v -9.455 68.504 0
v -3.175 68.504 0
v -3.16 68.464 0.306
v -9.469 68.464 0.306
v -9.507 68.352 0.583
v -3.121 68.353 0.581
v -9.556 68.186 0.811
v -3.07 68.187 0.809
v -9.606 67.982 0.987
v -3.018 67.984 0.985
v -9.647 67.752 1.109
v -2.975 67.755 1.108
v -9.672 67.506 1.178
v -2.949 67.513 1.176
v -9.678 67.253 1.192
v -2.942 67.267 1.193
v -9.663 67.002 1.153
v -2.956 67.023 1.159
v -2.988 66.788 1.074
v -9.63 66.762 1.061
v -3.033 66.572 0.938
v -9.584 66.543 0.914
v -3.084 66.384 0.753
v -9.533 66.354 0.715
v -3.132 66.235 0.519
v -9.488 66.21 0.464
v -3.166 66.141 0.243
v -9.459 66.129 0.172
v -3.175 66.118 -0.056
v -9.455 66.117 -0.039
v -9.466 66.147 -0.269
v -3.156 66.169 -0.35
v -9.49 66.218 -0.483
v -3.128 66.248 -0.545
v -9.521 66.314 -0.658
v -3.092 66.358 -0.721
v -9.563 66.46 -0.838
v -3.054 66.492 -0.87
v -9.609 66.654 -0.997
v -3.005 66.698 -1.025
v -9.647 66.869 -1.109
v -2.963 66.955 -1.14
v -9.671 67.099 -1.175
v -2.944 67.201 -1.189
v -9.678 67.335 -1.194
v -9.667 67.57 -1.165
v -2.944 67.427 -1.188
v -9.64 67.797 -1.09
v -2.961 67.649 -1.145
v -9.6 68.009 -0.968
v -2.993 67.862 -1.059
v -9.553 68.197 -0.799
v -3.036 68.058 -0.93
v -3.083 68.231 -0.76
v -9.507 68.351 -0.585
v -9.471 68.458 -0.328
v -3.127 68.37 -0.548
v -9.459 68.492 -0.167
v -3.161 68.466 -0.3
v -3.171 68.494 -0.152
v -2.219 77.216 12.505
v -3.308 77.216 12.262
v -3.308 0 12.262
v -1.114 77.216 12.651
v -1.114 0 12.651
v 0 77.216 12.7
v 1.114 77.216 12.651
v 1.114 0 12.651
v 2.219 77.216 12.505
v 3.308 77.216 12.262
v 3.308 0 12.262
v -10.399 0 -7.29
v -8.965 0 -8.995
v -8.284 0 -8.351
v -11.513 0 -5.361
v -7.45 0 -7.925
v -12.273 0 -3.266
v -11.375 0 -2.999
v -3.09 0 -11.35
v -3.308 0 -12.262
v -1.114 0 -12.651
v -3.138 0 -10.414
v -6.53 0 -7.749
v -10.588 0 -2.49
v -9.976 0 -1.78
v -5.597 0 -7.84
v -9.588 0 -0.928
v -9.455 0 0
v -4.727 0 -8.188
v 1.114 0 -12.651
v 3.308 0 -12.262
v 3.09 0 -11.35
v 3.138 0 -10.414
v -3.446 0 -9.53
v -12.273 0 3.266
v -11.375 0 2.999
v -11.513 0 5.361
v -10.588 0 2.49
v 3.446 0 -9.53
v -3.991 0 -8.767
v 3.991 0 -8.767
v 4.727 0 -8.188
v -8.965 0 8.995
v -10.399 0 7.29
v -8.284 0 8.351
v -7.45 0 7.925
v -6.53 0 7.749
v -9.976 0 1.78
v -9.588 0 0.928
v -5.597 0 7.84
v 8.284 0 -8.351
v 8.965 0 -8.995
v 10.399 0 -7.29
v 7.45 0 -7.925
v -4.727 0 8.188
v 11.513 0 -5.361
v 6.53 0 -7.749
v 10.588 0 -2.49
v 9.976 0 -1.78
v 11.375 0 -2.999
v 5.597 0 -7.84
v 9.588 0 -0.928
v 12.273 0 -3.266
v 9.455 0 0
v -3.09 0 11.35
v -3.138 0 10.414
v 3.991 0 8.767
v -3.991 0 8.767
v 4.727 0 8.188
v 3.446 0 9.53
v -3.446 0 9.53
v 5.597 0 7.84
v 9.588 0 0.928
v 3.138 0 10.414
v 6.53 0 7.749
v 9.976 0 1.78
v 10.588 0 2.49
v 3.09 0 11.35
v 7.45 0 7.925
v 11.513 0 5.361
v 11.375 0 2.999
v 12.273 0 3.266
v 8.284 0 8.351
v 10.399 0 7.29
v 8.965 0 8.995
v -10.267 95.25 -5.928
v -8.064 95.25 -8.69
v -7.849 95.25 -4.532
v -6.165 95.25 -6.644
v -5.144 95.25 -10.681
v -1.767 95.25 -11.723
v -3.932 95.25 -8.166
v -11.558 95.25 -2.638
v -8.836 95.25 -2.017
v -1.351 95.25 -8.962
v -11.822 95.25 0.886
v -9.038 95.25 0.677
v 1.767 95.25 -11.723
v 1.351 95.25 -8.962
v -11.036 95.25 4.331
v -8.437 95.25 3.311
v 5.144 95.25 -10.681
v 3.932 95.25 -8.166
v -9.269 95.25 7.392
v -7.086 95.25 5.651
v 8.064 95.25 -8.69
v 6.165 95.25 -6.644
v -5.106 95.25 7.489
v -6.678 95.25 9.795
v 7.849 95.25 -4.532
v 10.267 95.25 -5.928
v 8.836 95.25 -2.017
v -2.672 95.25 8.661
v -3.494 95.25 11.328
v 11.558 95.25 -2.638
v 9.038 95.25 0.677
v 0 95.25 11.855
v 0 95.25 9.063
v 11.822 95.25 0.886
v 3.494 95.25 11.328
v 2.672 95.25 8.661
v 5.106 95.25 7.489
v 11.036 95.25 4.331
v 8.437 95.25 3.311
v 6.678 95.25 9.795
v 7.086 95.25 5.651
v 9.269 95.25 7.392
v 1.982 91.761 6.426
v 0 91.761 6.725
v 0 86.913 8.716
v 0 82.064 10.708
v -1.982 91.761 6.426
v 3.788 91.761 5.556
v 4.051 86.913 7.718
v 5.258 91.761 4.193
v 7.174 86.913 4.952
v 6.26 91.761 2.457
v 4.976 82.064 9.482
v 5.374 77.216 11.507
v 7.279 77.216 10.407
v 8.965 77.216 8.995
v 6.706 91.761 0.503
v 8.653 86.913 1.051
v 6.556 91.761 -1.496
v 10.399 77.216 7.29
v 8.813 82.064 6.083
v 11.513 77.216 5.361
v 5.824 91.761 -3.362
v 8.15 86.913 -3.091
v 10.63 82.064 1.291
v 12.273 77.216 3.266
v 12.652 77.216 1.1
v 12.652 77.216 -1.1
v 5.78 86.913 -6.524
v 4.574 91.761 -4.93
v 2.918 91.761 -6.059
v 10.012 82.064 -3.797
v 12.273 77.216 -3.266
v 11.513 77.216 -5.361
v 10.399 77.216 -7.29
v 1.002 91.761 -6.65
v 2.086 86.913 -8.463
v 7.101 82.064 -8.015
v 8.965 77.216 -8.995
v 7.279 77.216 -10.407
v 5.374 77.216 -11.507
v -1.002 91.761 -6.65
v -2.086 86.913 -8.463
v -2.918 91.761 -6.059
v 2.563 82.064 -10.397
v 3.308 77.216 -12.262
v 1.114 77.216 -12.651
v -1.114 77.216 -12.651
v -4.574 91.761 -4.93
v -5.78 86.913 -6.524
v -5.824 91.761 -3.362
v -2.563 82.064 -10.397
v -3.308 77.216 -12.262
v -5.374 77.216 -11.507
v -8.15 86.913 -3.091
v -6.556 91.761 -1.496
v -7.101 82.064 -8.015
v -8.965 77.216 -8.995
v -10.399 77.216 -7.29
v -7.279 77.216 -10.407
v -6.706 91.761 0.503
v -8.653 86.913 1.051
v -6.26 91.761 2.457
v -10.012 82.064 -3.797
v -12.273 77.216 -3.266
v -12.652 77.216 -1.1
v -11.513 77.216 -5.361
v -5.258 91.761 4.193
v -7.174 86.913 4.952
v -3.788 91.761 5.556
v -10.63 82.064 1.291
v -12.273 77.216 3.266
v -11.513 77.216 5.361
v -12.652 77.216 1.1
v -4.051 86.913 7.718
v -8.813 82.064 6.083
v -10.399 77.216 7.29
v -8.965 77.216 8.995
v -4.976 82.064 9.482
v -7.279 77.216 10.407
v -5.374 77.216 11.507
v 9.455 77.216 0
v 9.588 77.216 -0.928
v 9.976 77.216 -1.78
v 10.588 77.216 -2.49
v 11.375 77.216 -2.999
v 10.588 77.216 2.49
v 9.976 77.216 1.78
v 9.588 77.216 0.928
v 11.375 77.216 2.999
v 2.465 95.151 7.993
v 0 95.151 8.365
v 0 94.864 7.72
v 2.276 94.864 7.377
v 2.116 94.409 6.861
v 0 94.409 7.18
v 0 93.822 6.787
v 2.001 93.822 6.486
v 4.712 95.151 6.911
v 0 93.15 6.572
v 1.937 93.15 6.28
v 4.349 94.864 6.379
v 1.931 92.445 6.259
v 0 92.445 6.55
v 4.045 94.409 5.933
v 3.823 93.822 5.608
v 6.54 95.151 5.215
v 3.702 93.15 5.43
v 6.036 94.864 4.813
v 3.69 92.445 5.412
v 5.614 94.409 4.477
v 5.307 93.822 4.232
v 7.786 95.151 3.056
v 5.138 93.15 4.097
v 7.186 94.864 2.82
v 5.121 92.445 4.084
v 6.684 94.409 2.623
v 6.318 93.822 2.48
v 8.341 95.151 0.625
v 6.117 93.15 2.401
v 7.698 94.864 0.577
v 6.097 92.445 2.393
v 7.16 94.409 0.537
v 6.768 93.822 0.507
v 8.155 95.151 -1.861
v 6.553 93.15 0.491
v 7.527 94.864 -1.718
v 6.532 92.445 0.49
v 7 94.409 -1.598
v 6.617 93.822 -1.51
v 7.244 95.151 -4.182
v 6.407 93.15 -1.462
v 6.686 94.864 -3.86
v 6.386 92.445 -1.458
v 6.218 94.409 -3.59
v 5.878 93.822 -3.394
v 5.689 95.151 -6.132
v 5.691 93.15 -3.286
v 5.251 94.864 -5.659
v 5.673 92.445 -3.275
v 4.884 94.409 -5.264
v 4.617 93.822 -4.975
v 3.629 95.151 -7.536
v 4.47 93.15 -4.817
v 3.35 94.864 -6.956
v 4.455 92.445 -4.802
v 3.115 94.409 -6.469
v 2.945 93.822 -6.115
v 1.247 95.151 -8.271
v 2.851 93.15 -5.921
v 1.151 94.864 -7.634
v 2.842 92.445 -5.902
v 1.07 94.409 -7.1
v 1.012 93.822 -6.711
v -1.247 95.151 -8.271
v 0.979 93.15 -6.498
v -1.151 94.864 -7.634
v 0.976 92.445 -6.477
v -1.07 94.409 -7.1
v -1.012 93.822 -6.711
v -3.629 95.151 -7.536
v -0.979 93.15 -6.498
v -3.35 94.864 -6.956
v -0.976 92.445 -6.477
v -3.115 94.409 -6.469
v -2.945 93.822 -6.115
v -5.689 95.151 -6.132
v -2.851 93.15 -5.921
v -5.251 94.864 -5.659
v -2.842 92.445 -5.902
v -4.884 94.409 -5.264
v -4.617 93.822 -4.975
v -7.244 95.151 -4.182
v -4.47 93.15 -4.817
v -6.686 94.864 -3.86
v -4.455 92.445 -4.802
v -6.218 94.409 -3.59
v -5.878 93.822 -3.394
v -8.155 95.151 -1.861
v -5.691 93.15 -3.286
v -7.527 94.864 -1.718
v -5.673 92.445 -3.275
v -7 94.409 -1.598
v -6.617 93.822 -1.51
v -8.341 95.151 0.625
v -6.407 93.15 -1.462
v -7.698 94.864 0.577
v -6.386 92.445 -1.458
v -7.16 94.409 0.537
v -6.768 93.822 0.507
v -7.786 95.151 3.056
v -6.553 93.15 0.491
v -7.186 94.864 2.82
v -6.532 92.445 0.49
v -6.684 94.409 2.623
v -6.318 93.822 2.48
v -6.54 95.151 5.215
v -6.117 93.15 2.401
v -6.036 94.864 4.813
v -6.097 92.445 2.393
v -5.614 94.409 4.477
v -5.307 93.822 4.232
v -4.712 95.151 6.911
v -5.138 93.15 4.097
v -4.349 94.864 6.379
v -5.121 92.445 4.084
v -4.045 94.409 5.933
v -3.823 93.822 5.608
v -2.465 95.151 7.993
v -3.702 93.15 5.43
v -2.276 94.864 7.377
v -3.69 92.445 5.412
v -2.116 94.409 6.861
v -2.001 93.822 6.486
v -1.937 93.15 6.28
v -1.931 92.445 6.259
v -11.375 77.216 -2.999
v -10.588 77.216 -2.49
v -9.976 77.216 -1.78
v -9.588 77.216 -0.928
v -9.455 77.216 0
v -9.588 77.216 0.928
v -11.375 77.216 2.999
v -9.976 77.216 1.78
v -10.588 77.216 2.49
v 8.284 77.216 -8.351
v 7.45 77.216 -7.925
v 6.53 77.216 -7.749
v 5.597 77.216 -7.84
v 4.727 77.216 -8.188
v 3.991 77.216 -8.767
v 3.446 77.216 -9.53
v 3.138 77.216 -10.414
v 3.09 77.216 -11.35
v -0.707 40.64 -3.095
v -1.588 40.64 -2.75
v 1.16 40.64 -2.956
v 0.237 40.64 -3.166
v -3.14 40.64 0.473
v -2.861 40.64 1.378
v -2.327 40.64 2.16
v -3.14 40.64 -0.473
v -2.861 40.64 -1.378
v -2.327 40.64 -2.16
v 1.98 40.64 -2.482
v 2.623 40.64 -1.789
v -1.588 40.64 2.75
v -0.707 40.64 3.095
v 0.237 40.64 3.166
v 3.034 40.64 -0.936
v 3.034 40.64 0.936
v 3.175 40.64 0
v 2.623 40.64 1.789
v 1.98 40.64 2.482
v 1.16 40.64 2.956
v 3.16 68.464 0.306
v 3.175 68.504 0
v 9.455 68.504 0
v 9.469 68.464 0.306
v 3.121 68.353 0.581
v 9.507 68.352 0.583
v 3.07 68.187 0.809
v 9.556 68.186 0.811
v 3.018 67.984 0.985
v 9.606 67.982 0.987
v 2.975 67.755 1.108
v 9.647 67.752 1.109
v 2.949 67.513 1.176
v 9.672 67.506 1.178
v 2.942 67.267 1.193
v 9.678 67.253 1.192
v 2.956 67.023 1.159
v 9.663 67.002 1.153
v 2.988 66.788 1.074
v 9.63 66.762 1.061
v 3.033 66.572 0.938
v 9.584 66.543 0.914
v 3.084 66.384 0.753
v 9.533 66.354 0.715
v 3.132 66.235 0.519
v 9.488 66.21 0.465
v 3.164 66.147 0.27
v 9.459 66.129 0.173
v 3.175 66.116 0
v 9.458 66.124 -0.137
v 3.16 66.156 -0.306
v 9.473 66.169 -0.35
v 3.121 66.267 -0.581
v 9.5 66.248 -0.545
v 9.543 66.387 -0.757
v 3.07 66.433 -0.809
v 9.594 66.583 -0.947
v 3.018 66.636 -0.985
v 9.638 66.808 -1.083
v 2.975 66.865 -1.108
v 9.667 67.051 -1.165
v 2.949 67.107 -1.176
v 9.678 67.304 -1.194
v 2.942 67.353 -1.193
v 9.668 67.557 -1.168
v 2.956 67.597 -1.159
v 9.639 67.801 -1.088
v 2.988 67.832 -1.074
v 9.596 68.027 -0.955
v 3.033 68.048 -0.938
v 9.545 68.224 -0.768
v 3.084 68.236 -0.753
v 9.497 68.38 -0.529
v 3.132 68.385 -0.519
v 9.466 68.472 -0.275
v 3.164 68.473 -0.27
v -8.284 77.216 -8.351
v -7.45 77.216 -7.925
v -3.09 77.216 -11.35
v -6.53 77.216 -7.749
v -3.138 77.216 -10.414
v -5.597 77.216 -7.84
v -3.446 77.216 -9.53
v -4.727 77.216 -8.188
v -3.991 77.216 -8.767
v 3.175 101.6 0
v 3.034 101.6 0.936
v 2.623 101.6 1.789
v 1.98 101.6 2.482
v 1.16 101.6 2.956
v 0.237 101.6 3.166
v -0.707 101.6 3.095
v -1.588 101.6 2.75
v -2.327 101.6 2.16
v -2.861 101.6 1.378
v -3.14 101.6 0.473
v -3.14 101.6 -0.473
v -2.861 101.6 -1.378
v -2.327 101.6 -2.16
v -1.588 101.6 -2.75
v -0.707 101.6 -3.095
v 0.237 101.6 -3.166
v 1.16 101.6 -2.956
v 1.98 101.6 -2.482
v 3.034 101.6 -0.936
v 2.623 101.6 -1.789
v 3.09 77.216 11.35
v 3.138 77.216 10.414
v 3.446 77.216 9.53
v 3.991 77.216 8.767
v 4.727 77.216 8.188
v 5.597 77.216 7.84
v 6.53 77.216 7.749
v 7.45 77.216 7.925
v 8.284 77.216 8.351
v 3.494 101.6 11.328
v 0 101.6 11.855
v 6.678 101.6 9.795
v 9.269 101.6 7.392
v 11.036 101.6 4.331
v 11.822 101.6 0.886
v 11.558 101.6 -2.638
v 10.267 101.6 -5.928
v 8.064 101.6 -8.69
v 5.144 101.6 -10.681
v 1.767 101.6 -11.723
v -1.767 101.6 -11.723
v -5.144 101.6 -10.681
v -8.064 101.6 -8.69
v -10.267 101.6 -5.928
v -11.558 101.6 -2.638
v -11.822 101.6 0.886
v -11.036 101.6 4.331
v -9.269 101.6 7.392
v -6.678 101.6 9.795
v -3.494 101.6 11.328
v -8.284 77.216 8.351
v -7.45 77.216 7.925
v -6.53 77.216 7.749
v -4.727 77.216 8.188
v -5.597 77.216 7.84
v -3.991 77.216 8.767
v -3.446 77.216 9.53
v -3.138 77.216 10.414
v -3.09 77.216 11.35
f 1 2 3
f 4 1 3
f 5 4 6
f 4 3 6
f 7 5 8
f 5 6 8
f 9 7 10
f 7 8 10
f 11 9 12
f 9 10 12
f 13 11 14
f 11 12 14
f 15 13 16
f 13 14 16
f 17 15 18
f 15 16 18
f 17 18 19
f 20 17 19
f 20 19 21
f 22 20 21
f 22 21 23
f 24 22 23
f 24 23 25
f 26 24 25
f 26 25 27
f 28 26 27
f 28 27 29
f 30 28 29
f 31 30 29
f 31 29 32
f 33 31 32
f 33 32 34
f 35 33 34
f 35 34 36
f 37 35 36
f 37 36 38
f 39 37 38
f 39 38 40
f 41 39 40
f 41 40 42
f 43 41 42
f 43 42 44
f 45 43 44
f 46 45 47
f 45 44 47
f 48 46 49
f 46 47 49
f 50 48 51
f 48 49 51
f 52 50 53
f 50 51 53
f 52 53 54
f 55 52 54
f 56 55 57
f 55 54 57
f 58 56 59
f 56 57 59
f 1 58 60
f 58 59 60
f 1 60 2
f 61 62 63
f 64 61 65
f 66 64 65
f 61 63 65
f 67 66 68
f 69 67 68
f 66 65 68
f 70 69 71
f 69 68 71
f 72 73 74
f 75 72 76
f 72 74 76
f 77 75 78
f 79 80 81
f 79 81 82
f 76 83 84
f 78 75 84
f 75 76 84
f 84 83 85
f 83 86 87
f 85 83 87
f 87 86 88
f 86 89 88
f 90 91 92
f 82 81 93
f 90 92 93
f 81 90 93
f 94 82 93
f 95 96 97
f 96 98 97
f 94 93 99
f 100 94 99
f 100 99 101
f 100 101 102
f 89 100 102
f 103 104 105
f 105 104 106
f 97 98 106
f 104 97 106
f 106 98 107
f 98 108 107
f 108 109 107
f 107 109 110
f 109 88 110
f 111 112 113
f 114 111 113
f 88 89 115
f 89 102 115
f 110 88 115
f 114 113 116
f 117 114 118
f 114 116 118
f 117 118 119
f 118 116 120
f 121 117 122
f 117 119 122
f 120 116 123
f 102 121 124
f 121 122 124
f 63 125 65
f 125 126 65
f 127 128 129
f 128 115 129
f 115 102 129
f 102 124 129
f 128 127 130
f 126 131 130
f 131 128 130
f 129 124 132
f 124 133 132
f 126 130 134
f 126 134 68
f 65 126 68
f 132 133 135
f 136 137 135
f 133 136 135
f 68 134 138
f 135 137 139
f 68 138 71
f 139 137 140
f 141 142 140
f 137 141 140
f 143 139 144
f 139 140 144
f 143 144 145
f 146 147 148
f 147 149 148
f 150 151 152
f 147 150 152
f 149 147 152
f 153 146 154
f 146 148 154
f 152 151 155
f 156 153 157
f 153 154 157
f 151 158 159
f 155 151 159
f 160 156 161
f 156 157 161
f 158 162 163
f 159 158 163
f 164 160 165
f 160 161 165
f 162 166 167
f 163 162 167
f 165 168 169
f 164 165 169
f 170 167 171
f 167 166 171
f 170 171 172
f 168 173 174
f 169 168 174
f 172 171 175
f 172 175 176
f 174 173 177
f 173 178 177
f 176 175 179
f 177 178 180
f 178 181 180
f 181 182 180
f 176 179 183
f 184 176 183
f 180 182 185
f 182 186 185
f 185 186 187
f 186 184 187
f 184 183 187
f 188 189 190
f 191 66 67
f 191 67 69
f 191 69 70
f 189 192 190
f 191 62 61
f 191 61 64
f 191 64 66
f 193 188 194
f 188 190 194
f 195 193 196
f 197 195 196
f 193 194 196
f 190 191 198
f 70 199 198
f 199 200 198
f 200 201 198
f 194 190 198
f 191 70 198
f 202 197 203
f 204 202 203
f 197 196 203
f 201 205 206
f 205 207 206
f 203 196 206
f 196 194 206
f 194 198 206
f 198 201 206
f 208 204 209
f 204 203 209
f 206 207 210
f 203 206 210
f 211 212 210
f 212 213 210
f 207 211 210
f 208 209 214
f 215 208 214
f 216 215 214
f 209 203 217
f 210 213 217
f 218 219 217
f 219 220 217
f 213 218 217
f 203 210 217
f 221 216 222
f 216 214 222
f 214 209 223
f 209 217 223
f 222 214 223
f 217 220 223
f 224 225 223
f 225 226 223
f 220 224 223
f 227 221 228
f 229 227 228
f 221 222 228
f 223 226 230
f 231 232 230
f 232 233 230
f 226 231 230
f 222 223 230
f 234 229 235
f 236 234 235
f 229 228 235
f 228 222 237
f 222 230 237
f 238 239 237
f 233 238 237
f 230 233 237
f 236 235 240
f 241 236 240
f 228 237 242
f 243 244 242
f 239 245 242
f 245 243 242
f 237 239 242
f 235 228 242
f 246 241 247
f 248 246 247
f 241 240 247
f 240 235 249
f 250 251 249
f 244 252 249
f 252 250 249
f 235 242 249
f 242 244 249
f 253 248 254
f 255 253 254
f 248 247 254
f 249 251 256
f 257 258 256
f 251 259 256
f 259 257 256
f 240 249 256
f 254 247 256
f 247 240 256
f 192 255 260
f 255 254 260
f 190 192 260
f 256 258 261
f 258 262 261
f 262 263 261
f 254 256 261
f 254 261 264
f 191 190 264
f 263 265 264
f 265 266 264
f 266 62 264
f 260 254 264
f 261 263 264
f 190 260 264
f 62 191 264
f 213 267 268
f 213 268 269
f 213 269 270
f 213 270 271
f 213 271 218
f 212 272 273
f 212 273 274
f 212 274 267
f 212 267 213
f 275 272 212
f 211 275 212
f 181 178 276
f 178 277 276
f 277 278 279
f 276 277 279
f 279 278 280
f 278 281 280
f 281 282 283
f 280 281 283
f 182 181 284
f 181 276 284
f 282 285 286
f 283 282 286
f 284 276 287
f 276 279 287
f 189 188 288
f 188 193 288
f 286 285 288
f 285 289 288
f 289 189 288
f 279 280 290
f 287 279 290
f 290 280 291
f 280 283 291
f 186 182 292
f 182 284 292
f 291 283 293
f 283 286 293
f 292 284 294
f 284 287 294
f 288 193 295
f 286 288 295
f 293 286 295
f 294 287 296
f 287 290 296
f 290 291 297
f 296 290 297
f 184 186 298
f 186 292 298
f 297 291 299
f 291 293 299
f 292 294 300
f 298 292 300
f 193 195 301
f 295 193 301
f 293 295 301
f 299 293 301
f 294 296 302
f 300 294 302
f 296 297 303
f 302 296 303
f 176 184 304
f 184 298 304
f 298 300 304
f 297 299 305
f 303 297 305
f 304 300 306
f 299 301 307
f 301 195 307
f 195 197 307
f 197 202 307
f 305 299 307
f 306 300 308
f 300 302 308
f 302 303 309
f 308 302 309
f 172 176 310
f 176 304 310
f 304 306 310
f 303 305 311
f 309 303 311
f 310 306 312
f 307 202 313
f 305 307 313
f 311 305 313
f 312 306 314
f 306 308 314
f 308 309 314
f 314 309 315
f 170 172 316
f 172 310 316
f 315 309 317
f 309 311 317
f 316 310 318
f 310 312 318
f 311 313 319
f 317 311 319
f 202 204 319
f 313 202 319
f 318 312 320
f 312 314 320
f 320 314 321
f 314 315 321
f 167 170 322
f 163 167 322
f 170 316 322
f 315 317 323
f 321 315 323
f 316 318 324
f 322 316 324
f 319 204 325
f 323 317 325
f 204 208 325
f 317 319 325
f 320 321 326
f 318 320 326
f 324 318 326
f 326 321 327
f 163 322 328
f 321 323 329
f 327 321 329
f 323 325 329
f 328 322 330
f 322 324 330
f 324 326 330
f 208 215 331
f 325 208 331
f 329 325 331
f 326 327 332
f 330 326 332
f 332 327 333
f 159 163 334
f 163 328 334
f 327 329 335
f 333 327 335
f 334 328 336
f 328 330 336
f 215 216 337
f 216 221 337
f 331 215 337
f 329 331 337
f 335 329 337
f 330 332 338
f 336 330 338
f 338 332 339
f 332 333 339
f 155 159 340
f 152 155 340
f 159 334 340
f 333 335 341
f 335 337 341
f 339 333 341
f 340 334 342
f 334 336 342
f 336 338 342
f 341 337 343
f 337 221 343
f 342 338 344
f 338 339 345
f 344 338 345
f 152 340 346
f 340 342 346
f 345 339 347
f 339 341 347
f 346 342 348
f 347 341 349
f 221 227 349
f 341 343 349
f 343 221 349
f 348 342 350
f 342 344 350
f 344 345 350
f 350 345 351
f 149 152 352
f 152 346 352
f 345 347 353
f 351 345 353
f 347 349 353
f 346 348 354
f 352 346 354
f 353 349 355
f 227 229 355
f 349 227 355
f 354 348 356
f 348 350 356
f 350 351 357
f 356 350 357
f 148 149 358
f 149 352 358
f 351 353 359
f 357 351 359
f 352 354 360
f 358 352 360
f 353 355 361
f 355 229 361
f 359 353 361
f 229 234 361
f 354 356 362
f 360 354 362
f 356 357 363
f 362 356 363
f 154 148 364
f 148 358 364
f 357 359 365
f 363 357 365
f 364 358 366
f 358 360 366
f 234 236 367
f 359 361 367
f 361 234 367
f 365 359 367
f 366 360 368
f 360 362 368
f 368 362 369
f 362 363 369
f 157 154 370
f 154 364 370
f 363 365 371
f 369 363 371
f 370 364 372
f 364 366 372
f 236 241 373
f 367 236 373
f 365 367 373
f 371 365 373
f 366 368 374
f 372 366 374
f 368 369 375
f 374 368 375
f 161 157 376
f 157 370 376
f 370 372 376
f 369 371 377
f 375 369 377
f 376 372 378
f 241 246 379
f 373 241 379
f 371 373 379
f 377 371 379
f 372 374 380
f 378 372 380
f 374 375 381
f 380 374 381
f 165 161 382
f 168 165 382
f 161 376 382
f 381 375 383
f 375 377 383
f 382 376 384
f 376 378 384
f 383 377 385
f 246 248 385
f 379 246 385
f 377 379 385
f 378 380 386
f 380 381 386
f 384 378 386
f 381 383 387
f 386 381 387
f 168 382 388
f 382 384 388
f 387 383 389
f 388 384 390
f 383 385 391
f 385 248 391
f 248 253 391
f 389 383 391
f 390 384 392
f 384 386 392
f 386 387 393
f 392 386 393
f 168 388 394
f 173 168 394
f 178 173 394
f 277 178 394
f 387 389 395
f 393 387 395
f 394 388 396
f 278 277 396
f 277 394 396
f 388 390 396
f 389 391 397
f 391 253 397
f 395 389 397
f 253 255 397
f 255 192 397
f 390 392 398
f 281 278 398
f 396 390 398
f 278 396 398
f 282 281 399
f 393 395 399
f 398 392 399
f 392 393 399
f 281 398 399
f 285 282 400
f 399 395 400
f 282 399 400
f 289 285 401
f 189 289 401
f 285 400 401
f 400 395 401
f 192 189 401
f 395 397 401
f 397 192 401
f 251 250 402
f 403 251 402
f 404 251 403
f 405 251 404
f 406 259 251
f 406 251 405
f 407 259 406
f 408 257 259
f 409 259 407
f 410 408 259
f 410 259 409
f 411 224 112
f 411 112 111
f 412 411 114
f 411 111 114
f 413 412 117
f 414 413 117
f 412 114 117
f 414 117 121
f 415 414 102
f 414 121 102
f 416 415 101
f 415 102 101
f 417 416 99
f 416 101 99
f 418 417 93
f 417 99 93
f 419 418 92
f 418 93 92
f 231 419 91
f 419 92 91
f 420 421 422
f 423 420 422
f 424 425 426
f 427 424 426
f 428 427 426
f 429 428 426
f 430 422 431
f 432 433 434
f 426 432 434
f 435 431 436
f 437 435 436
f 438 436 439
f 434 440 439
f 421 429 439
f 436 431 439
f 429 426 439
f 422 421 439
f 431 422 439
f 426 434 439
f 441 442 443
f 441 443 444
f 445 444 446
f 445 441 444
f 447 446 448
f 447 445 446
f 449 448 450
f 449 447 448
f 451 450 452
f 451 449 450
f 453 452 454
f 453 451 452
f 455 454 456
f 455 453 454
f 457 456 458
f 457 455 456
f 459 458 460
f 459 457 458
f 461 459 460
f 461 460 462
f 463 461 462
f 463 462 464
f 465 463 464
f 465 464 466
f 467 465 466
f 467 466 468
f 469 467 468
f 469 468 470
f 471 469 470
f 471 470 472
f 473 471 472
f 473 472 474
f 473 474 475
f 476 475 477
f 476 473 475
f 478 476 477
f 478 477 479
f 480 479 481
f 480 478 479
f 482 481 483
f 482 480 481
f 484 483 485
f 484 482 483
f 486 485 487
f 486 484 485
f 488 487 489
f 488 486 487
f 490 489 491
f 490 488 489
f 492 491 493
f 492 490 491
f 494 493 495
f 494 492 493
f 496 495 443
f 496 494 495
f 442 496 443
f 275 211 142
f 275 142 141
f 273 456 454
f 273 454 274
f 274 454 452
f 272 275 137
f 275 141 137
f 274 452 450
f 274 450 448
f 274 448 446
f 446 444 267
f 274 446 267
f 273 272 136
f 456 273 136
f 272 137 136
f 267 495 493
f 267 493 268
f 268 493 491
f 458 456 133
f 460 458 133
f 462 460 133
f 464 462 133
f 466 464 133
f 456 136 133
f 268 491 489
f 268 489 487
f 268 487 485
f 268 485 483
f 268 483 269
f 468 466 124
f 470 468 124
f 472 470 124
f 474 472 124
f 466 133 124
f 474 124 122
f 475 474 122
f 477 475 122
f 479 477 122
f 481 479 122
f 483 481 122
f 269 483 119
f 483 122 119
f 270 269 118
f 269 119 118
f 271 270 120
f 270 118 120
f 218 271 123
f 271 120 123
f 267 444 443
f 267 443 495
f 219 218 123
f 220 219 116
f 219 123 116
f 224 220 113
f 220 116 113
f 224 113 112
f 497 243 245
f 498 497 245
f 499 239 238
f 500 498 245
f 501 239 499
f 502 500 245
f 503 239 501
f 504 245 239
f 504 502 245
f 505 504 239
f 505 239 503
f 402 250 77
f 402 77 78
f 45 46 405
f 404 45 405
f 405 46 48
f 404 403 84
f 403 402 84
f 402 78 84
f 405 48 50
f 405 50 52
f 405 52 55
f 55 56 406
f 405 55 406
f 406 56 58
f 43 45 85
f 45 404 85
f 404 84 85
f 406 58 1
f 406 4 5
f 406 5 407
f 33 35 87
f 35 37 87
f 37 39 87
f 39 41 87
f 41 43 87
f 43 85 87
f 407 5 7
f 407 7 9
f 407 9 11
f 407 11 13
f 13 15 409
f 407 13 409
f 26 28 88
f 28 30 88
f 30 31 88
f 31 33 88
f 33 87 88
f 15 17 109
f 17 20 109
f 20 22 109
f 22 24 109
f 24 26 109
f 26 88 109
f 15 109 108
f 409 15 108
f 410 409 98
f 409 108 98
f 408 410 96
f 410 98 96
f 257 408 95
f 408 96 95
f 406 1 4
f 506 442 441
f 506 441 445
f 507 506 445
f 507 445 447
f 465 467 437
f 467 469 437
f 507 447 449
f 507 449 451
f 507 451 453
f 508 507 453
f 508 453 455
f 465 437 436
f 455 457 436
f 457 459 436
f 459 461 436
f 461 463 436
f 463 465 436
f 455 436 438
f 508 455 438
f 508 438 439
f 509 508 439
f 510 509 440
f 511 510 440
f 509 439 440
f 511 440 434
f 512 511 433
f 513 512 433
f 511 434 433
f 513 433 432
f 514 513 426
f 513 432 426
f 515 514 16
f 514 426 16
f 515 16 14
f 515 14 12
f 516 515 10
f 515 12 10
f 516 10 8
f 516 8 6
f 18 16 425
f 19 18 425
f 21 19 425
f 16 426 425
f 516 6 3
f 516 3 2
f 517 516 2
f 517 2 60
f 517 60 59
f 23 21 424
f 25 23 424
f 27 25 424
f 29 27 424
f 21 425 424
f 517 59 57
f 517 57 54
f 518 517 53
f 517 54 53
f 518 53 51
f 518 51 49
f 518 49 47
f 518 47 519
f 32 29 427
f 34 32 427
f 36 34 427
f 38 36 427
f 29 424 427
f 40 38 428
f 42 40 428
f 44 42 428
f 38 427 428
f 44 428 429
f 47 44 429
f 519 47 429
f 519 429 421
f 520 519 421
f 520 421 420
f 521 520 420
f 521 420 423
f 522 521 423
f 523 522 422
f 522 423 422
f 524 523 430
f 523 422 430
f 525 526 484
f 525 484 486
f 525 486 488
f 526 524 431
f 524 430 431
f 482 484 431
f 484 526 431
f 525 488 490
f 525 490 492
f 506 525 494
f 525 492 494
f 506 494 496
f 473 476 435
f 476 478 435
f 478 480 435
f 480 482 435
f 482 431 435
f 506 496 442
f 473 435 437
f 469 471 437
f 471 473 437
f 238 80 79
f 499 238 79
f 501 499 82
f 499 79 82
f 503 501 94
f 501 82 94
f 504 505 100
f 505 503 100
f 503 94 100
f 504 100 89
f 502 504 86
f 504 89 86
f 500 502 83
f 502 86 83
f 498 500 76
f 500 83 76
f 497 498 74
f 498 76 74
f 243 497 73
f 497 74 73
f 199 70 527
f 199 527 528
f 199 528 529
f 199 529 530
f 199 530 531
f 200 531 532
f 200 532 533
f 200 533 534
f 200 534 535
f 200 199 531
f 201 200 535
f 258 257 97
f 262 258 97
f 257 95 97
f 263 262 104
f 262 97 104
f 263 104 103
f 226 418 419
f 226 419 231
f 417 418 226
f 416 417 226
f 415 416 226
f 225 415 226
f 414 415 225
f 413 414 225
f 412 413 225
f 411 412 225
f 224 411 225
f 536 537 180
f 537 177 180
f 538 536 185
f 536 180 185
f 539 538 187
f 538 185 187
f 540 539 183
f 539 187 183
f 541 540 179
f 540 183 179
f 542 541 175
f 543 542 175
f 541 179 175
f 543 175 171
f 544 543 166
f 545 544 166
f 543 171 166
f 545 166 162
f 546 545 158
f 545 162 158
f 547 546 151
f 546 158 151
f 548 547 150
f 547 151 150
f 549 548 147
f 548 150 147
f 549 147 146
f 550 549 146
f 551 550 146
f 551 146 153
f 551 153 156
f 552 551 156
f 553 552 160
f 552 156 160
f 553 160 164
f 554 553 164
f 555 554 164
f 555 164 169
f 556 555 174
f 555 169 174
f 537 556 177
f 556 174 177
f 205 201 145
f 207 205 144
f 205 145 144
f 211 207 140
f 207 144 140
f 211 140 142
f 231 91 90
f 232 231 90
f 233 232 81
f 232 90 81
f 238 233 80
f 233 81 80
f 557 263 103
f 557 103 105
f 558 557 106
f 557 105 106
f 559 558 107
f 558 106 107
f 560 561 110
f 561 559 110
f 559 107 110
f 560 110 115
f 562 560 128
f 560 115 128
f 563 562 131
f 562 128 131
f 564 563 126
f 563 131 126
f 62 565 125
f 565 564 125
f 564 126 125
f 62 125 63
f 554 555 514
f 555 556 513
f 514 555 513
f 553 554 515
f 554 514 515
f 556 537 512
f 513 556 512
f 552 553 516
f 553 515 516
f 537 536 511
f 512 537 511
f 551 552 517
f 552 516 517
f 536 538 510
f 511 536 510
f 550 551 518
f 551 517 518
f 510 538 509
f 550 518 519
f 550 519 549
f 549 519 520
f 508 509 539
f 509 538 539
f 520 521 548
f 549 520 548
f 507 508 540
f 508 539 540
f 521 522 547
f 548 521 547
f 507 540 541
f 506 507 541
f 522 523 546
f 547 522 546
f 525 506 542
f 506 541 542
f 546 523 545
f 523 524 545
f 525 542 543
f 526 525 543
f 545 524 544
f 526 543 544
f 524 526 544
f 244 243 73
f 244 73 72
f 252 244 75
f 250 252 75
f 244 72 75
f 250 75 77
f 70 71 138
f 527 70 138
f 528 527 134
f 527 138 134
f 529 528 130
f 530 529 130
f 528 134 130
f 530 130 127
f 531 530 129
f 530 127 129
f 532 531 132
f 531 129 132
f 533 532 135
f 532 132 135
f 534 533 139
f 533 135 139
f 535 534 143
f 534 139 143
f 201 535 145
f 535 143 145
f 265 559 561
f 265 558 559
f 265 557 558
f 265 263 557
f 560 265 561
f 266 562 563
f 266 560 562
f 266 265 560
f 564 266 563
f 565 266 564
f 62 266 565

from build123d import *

# Parameters (mm, degrees)
F2_R          = 3.302
F3_DEPTH      = 77.216
F5_START      = -40.64
F4_R          = 3.175
F5_DEPTH      = 60.961
F6_R          = 1.1938
F7_DEPTH      = 25.4
F7_DEPTH_BACK = 25.4


# Not quite as in the source:
# - a feature names something its author has since deleted; it is built from what else it names


with BuildPart() as f1:
    # F0 (on Right) → F1 (revolve)
    with BuildSketch(Plane.YZ):
        with BuildLine():
            Line((0, 12.7), (0, 0))
            Line((0, 0), (101.6, 0))
            Line((101.6, 0), (101.6, 11.8551712597))
            Line((101.6, 11.8551712597), (95.25, 11.8551712597))
            Line((95.25, 11.8551712597), (95.25, 9.0634808418))
            ThreePointArc((95.25, 9.0634808418), (94.1293552402, 6.9632371008), (91.7608131807, 6.7247481879))
            Line((91.7608131807, 6.7247481879), (77.216, 12.7))
            Line((77.216, 12.7), (0, 12.7))
        make_face()
    revolve(axis=Axis((0, 50.8, 0), (0, 1, 0)))

    # F2 (on Front) → F3 (cut)
    with BuildSketch(Plane.XZ):
        with Locations((12.7568459138, 0)):
            Circle(F2_R)
        with Locations((6.3784229569, 11.0477526335)):
            Circle(F2_R)
        with Locations((-6.3784229569, 11.0477526335)):
            Circle(F2_R)
        with Locations((-12.7568459138, 0)):
            Circle(F2_R)
        with Locations((-6.3784229569, -11.0477526335)):
            Circle(F2_R)
        with Locations((6.3784229569, -11.0477526335)):
            Circle(F2_R)
    extrude(amount=-F3_DEPTH, mode=Mode.SUBTRACT)

    # F4 (on Front) → F5 (cut)
    with BuildSketch(Plane.XZ.offset(F5_START)):
        Circle(F4_R)
    extrude(amount=-F5_DEPTH, mode=Mode.SUBTRACT)

    # F6 (on Right) → F7 (cut, two sides)
    with BuildSketch(Plane.YZ) as f7_sk:
        with Locations((67.31, 0)):
            Circle(F6_R)
    extrude(amount=-F7_DEPTH, mode=Mode.SUBTRACT)
    extrude(f7_sk.sketch, amount=F7_DEPTH_BACK, mode=Mode.SUBTRACT)


solid = f1.part
